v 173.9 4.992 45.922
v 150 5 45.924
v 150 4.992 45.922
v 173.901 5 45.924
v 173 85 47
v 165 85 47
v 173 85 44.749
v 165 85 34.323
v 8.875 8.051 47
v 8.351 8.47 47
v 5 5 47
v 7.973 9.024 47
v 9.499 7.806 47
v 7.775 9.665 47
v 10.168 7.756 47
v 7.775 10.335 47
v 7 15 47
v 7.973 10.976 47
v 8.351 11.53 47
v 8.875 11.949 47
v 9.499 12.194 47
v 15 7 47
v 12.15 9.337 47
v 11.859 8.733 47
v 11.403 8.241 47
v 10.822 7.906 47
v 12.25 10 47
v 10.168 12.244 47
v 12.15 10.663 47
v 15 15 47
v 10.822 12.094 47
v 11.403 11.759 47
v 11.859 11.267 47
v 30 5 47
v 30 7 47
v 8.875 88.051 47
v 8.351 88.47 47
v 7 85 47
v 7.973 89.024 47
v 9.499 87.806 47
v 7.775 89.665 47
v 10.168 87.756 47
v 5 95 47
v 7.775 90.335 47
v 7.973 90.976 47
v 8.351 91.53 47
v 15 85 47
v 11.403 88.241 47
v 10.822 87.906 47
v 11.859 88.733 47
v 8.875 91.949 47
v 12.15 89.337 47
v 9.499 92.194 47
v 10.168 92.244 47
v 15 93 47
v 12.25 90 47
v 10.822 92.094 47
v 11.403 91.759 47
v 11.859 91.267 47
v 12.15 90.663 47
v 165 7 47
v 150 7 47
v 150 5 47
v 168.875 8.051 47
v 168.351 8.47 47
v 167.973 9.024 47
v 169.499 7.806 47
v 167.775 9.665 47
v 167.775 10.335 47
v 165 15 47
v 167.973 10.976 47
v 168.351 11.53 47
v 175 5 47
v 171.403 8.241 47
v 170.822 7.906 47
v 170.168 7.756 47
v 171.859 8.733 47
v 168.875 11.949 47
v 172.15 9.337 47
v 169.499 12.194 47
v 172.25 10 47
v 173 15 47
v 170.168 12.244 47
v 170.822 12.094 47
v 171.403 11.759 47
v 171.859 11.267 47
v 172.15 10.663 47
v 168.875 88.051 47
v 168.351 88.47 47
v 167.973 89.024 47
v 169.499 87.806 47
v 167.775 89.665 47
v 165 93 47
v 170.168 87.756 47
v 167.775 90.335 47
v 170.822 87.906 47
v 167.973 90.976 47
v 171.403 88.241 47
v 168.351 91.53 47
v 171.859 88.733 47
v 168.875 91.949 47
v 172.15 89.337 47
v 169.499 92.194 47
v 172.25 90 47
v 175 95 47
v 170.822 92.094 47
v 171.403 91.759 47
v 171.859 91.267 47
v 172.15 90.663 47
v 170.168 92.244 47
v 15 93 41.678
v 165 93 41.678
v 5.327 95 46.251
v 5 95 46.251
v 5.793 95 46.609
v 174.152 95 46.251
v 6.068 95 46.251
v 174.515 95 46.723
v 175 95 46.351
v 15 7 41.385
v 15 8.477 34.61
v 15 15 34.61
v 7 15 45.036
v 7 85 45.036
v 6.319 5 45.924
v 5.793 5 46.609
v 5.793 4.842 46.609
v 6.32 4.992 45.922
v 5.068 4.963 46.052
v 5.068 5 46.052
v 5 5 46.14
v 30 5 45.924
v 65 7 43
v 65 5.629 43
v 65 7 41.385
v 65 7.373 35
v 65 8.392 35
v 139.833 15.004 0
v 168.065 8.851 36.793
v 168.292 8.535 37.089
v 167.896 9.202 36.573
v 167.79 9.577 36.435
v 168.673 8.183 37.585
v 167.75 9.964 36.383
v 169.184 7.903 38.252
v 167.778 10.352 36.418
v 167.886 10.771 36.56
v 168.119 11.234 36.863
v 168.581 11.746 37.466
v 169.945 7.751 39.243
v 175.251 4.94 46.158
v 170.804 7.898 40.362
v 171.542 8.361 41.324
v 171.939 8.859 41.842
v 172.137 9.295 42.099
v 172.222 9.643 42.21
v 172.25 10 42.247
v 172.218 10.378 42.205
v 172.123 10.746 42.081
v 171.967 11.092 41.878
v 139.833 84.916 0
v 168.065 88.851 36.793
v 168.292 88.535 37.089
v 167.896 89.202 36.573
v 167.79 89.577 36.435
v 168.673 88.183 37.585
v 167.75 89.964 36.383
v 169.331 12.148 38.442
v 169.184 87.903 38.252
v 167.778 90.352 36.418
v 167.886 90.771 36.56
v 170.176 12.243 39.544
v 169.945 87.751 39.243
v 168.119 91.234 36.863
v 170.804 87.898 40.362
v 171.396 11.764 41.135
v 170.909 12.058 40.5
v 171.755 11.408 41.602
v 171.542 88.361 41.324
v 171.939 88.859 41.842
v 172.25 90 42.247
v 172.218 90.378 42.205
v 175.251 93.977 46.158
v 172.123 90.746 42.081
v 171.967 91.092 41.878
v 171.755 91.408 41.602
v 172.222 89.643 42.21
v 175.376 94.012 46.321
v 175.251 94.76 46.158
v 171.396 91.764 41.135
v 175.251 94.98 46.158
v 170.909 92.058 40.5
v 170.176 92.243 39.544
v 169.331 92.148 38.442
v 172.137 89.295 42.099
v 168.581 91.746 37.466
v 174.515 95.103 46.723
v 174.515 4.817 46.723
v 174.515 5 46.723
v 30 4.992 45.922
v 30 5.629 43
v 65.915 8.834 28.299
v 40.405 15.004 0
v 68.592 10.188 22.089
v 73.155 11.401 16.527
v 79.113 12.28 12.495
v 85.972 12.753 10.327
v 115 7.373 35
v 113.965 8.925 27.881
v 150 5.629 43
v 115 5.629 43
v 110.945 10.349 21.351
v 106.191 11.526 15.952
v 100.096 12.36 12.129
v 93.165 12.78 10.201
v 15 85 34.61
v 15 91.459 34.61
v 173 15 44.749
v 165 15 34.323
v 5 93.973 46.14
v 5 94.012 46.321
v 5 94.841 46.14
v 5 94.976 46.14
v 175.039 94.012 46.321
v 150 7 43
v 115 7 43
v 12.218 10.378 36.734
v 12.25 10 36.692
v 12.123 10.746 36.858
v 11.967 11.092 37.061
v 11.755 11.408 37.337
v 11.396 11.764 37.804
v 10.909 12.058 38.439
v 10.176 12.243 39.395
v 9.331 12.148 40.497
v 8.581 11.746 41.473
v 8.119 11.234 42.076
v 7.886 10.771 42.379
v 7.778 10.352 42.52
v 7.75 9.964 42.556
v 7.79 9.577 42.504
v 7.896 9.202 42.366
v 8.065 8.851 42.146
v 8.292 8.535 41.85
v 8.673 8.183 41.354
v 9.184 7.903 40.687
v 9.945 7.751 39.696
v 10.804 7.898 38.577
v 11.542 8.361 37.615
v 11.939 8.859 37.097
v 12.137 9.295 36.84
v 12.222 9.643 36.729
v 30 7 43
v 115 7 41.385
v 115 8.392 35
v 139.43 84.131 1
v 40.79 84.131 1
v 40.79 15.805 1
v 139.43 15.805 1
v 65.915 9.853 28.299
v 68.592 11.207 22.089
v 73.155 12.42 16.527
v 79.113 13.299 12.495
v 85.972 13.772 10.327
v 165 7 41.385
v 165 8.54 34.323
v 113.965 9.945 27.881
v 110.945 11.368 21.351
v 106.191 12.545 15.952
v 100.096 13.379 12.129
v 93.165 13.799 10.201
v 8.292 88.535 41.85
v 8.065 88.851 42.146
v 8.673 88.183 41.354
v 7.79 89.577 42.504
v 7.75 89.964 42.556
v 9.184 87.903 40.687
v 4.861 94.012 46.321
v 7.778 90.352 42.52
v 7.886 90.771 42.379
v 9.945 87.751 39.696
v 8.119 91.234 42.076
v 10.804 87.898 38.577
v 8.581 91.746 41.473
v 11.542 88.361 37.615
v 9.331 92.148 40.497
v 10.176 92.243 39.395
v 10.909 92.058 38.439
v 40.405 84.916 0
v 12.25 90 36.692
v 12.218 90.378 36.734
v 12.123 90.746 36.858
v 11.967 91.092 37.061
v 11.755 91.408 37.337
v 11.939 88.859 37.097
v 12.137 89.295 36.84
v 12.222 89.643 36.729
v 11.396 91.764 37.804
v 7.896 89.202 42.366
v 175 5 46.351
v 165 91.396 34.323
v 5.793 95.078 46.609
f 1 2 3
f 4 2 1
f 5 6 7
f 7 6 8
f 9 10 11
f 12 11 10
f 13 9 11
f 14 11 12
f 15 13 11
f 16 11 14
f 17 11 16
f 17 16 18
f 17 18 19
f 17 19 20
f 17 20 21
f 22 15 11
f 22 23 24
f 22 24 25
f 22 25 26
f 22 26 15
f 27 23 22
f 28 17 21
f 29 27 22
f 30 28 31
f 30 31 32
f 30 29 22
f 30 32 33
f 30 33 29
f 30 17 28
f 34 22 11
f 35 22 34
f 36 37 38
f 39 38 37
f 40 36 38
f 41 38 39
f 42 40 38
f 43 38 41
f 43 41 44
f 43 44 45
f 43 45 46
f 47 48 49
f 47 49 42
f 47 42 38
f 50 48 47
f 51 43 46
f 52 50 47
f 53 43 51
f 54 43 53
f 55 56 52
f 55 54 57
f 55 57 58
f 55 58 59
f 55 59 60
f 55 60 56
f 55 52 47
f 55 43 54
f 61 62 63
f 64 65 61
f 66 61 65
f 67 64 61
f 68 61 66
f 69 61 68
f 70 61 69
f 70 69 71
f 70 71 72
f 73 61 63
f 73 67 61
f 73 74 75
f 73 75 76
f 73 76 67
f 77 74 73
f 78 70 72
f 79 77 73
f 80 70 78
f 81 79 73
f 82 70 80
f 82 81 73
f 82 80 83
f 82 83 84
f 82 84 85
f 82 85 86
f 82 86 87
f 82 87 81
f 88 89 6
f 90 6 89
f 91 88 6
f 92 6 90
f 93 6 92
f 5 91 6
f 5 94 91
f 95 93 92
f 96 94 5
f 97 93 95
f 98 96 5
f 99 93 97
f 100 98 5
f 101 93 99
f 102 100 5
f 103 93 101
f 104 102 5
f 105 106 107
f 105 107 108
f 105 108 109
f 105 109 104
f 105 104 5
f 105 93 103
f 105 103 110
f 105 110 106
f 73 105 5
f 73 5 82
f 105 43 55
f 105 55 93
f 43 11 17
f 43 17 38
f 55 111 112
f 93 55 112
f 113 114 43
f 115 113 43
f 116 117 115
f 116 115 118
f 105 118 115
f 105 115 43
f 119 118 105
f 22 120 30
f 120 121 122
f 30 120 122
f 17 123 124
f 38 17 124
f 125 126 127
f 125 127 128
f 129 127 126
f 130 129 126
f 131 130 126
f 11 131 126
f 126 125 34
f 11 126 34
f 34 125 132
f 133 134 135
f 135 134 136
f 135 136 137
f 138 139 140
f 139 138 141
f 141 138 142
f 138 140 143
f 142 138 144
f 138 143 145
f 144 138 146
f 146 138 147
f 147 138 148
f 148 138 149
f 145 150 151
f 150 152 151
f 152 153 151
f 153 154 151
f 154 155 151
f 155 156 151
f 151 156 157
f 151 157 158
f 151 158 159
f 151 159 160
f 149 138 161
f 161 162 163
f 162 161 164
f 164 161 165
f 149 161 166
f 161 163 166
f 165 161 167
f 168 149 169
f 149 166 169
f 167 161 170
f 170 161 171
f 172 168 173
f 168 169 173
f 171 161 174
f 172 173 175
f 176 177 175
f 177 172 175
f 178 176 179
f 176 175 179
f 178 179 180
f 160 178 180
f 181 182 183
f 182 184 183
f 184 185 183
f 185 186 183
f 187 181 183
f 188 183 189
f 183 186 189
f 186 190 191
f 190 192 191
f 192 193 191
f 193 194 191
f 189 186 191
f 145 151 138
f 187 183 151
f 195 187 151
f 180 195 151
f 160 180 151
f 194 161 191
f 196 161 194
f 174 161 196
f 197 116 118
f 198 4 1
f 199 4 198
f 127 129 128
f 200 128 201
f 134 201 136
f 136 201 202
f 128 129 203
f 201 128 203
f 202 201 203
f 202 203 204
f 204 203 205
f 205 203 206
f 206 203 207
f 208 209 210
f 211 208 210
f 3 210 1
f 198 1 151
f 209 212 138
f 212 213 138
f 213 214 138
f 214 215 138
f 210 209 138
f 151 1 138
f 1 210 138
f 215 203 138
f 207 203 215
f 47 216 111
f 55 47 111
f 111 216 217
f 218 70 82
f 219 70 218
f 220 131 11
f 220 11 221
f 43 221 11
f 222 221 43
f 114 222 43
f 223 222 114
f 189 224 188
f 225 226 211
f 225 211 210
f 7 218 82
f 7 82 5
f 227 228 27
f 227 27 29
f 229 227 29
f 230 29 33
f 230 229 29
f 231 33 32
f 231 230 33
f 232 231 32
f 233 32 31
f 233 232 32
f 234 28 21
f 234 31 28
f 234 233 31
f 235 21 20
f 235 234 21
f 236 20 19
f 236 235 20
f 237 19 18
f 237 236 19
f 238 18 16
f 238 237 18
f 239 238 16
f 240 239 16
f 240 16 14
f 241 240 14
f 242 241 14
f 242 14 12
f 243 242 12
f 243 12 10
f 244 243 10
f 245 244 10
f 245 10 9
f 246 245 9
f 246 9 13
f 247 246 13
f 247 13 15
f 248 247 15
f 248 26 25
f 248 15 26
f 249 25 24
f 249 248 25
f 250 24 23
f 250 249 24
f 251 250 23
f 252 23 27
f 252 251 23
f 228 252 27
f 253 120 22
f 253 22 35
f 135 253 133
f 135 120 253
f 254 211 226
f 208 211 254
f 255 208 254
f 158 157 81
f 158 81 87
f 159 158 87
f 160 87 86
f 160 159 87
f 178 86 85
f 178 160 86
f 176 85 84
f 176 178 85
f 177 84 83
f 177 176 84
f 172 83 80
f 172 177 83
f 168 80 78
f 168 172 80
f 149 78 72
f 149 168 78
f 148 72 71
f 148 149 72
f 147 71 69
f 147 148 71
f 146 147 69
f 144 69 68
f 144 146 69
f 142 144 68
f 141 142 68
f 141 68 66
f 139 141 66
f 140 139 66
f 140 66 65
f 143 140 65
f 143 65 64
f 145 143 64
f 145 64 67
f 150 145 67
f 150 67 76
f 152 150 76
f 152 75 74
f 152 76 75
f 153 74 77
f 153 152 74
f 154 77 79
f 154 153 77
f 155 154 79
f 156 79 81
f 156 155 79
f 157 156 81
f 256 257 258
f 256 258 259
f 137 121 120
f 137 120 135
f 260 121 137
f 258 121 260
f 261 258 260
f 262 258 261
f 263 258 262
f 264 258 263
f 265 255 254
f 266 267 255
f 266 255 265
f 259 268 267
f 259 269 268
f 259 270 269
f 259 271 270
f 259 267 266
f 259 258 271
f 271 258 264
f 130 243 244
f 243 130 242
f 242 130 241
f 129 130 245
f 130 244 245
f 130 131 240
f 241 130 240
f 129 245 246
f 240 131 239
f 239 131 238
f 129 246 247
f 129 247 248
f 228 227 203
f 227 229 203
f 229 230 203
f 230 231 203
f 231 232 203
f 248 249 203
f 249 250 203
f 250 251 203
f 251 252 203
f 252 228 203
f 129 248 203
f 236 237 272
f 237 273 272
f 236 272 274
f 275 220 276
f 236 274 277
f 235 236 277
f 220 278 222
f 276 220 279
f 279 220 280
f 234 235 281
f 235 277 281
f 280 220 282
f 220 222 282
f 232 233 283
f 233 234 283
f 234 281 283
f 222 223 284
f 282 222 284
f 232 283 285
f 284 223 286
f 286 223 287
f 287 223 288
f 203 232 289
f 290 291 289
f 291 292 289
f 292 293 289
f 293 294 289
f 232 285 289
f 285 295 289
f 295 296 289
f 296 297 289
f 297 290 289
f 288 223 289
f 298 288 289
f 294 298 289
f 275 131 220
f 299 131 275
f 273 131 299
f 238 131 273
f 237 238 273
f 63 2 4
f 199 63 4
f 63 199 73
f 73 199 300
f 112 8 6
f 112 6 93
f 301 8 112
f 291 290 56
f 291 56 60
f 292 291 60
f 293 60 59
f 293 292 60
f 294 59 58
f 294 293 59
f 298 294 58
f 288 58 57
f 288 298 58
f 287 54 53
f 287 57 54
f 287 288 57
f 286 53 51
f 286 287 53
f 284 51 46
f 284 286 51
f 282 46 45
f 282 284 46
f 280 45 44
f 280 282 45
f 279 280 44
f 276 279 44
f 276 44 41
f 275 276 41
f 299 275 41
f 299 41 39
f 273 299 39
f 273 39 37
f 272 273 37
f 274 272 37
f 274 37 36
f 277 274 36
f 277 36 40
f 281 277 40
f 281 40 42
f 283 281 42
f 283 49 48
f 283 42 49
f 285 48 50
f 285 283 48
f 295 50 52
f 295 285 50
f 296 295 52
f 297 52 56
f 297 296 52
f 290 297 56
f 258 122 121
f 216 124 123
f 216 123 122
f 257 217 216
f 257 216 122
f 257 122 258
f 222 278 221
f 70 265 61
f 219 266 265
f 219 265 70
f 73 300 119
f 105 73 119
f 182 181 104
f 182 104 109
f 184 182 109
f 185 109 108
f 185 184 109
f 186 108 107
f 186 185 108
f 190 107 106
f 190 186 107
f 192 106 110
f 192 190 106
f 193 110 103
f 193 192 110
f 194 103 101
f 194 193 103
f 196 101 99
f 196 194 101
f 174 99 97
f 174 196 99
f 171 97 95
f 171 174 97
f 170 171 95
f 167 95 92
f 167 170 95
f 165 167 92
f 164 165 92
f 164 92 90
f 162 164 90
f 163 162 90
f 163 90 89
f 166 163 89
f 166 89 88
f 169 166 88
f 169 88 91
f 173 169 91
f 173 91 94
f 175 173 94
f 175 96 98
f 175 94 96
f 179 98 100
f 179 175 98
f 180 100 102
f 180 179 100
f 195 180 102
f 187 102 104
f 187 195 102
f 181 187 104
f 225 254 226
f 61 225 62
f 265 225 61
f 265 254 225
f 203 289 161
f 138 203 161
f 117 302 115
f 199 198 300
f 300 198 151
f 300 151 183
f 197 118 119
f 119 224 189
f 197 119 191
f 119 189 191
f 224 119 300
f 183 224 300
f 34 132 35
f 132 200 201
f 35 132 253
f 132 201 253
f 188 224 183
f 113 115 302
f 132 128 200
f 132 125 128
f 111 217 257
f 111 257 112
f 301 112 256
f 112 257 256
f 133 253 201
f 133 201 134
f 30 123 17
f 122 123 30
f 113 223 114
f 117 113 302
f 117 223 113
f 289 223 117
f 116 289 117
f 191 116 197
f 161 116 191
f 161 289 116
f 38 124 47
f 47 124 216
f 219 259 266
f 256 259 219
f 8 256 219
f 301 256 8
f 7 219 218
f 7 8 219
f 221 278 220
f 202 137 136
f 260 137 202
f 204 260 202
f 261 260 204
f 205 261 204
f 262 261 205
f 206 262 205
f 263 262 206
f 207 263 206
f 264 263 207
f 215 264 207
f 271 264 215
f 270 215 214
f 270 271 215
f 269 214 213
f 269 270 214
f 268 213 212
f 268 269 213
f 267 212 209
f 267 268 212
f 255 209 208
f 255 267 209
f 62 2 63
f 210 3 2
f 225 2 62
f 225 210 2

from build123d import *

# Parameters (mm, degrees)
BOX020_W               = 50
BOX020_H               = 20
BOX020_DEPTH           = 25
CYLINDER004_R          = 25
CYLINDER004_DEPTH      = 20
CYLINDER004_ROLL_ANGLE = 90
BOX019_W               = 120
BOX019_H               = 10
BOX019_DEPTH           = 10
CYLINDER003_R          = 2.25
CYLINDER003_DEPTH      = 60
CYLINDER002_R          = 2.25
CYLINDER002_DEPTH      = 60
CYLINDER001_R          = 2.25
CYLINDER001_DEPTH      = 60
CYLINDER_R             = 2.25
CYLINDER_DEPTH         = 60
BOX018_W               = 180
BOX018_H               = 50
BOX018_DEPTH           = 60
BOX018_ROLL_ANGLE      = -12.3
BOX017_W               = 180
BOX017_H               = 50
BOX017_DEPTH           = 60
BOX017_ROLL_ANGLE      = 12.3
BOX016_W               = 70
BOX016_H               = 100
BOX016_DEPTH           = 50
BOX016_PITCH_ANGLE     = 52.5
BOX015_W               = 70
BOX015_H               = 100
BOX015_DEPTH           = 50
BOX015_PITCH_ANGLE     = -52.5
BOX007_W               = 100
BOX007_H               = 70
BOX007_DEPTH           = 1
BOX014_W               = 170
BOX014_H               = 2
BOX014_DEPTH           = 7
BOX013_W               = 170
BOX013_H               = 2
BOX013_DEPTH           = 7
BOX012_W               = 2
BOX012_H               = 80
BOX012_DEPTH           = 2.5
BOX011_W               = 2
BOX011_H               = 80
BOX011_DEPTH           = 2.5
BOX010_W               = 10
BOX010_H               = 10
BOX010_DEPTH           = 13
BOX009_W               = 10
BOX009_H               = 10
BOX009_DEPTH           = 13
BOX008_W               = 10
BOX008_H               = 10
BOX008_DEPTH           = 13
BOX_W                  = 10
BOX_H                  = 10
BOX_DEPTH              = 13
BOX005_W               = 180
BOX005_H               = 1
BOX005_DEPTH           = 47
BOX005_ROLL_ANGLE      = -12.3
BOX004_W               = 180
BOX004_H               = 1
BOX004_DEPTH           = 47
BOX004_ROLL_ANGLE      = 12.3
BOX003_W               = 58
BOX003_H               = 100
BOX003_DEPTH           = 1
BOX003_PITCH_ANGLE     = -52.5
BOX002_W               = 58
BOX002_H               = 100
BOX002_DEPTH           = 1
BOX002_PITCH_ANGLE     = 52.5


with BuildPart() as cube020:
    # Box020 → Box020 (new body)
    with BuildSketch(Plane(origin=(65, 0, 35), x_dir=(1, 0, 0), z_dir=(0, 0, 1))):
        with Locations((25, 10)):
            Rectangle(BOX020_W, BOX020_H)
    extrude(amount=BOX020_DEPTH)


with BuildPart() as cylinder:
    # Cylinder004 → Cylinder004 (new body)
    with BuildSketch(Plane.XY):
        Circle(CYLINDER004_R)
    extrude(amount=CYLINDER004_DEPTH)


with BuildPart() as cylinder_1:
    # Cylinder004 roll: moved
    add(cylinder.part.rotate(Axis((0, 0, 0), (1, 0, 0)), CYLINDER004_ROLL_ANGLE))


with BuildPart() as cylinder_2:
    # Cylinder004 placement: moved
    add(cylinder_1.part.moved(Location((90, 20, 35))))


with BuildPart() as cube019:
    # Box019 → Box019 (new body)
    with BuildSketch(Plane(origin=(30, 0, 43), x_dir=(1, 0, 0), z_dir=(0, 0, 1))):
        with Locations((60, 5)):
            Rectangle(BOX019_W, BOX019_H)
    extrude(amount=BOX019_DEPTH)


with BuildPart() as cylinder003:
    # Cylinder003 → Cylinder003 (new body)
    with BuildSketch(Plane(origin=(170, 90, 0), x_dir=(1, 0, 0), z_dir=(0, 0, 1))):
        Circle(CYLINDER003_R)
    extrude(amount=CYLINDER003_DEPTH)


with BuildPart() as cylinder002:
    # Cylinder002 → Cylinder002 (new body)
    with BuildSketch(Plane(origin=(10, 90, 0), x_dir=(1, 0, 0), z_dir=(0, 0, 1))):
        Circle(CYLINDER002_R)
    extrude(amount=CYLINDER002_DEPTH)


with BuildPart() as cylinder001:
    # Cylinder001 → Cylinder001 (new body)
    with BuildSketch(Plane(origin=(170, 10, 0), x_dir=(1, 0, 0), z_dir=(0, 0, 1))):
        Circle(CYLINDER001_R)
    extrude(amount=CYLINDER001_DEPTH)


with BuildPart() as cylinder000:
    # Cylinder → Cylinder (new body)
    with BuildSketch(Plane(origin=(10, 10, 0), x_dir=(1, 0, 0), z_dir=(0, 0, 1))):
        Circle(CYLINDER_R)
    extrude(amount=CYLINDER_DEPTH)


with BuildPart() as cube018:
    # Box018 → Box018 (new body)
    with BuildSketch(Plane.XY):
        with Locations((90, 25)):
            Rectangle(BOX018_W, BOX018_H)
    extrude(amount=BOX018_DEPTH)


with BuildPart() as cube018_1:
    # Box018 roll: moved
    add(cube018.part.rotate(Axis((0, 0, 0), (1, 0, 0)), BOX018_ROLL_ANGLE))


with BuildPart() as cube018_2:
    # Box018 placement: moved
    add(cube018_1.part.moved(Location((1, 84, -4.2))))


with BuildPart() as cube017:
    # Box017 → Box017 (new body)
    with BuildSketch(Plane.XY):
        with Locations((90, 25)):
            Rectangle(BOX017_W, BOX017_H)
    extrude(amount=BOX017_DEPTH)


with BuildPart() as cube017_1:
    # Box017 roll: moved
    add(cube017.part.rotate(Axis((0, 0, 0), (1, 0, 0)), BOX017_ROLL_ANGLE))


with BuildPart() as cube017_2:
    # Box017 placement: moved
    add(cube017_1.part.moved(Location((1, -32.9, -15))))


with BuildPart() as cube016:
    # Box016 → Box016 (new body)
    with BuildSketch(Plane.XY):
        with Locations((35, 50)):
            Rectangle(BOX016_W, BOX016_H)
    extrude(amount=BOX016_DEPTH)


with BuildPart() as cube016_1:
    # Box016 pitch: moved
    add(cube016.part.rotate(Axis((0, 0, 0), (0, 1, 0)), BOX016_PITCH_ANGLE))


with BuildPart() as cube016_2:
    # Box016 placement: moved
    add(cube016_1.part.moved(Location((-39.5, 0, 22))))


with BuildPart() as cube015:
    # Box015 → Box015 (new body)
    with BuildSketch(Plane.XY):
        with Locations((35, 50)):
            Rectangle(BOX015_W, BOX015_H)
    extrude(amount=BOX015_DEPTH)


with BuildPart() as cube015_1:
    # Box015 pitch: moved
    add(cube015.part.rotate(Axis((0, 0, 0), (0, 1, 0)), BOX015_PITCH_ANGLE))


with BuildPart() as cube015_2:
    # Box015 placement: moved
    add(cube015_1.part.moved(Location((176, 0, -35))))


with BuildPart() as cube007:
    # Box007 → Box007 (new body)
    with BuildSketch(Plane(origin=(40, 15, 0), x_dir=(1, 0, 0), z_dir=(0, 0, 1))):
        with Locations((50, 35)):
            Rectangle(BOX007_W, BOX007_H)
    extrude(amount=BOX007_DEPTH)


with BuildPart() as cube014:
    # Box014 → Box014 (new body)
    with BuildSketch(Plane(origin=(5, 93, 40), x_dir=(1, 0, 0), z_dir=(0, 0, 1))):
        with Locations((85, 1)):
            Rectangle(BOX014_W, BOX014_H)
    extrude(amount=BOX014_DEPTH)


with BuildPart() as cube013:
    # Box013 → Box013 (new body)
    with BuildSketch(Plane(origin=(5, 5, 40), x_dir=(1, 0, 0), z_dir=(0, 0, 1))):
        with Locations((85, 1)):
            Rectangle(BOX013_W, BOX013_H)
    extrude(amount=BOX013_DEPTH)


with BuildPart() as cube012:
    # Box012 → Box012 (new body)
    with BuildSketch(Plane(origin=(173, 5, 44.5), x_dir=(1, 0, 0), z_dir=(0, 0, 1))):
        with Locations((1, 40)):
            Rectangle(BOX012_W, BOX012_H)
    extrude(amount=BOX012_DEPTH)


with BuildPart() as cube011:
    # Box011 → Box011 (new body)
    with BuildSketch(Plane(origin=(5, 5, 44.5), x_dir=(1, 0, 0), z_dir=(0, 0, 1))):
        with Locations((1, 40)):
            Rectangle(BOX011_W, BOX011_H)
    extrude(amount=BOX011_DEPTH)


with BuildPart() as cube010:
    # Box010 → Box010 (new body)
    with BuildSketch(Plane(origin=(5, 85, 34), x_dir=(1, 0, 0), z_dir=(0, 0, 1))):
        with Locations((5, 5)):
            Rectangle(BOX010_W, BOX010_H)
    extrude(amount=BOX010_DEPTH)


with BuildPart() as cube009:
    # Box009 → Box009 (new body)
    with BuildSketch(Plane(origin=(165, 85, 34), x_dir=(1, 0, 0), z_dir=(0, 0, 1))):
        with Locations((5, 5)):
            Rectangle(BOX009_W, BOX009_H)
    extrude(amount=BOX009_DEPTH)


with BuildPart() as cube008:
    # Box008 → Box008 (new body)
    with BuildSketch(Plane(origin=(165, 5, 34), x_dir=(1, 0, 0), z_dir=(0, 0, 1))):
        with Locations((5, 5)):
            Rectangle(BOX008_W, BOX008_H)
    extrude(amount=BOX008_DEPTH)


with BuildPart() as cube:
    # Box → Box (new body)
    with BuildSketch(Plane(origin=(5, 5, 34), x_dir=(1, 0, 0), z_dir=(0, 0, 1))):
        with Locations((5, 5)):
            Rectangle(BOX_W, BOX_H)
    extrude(amount=BOX_DEPTH)


with BuildPart() as cube005:
    # Box005 → Box005 (new body)
    with BuildSketch(Plane.XY):
        with Locations((90, 0.5)):
            Rectangle(BOX005_W, BOX005_H)
    extrude(amount=BOX005_DEPTH)


with BuildPart() as cube005_1:
    # Box005 roll: moved
    add(cube005.part.rotate(Axis((0, 0, 0), (1, 0, 0)), BOX005_ROLL_ANGLE))


with BuildPart() as cube005_2:
    # Box005 placement: moved
    add(cube005_1.part.moved(Location((1, 84, 0.4))))


with BuildPart() as fusion001:
    # Box004 → Box004 (new body)
    with BuildSketch(Plane.XY):
        with Locations((90, 0.5)):
            Rectangle(BOX004_W, BOX004_H)
    extrude(amount=BOX004_DEPTH)


with BuildPart() as fusion001_1:
    # Box004 roll: moved
    add(fusion001.part.rotate(Axis((0, 0, 0), (1, 0, 0)), BOX004_ROLL_ANGLE))


with BuildPart() as fusion001_2:
    # Box004 placement: moved
    add(fusion001_1.part.moved(Location((1, 15, 0))))

    # Fusion001: union Cube005
    add(cube005_2.part)


with BuildPart() as cube003:
    # Box003 → Box003 (new body)
    with BuildSketch(Plane.XY):
        with Locations((29, 50)):
            Rectangle(BOX003_W, BOX003_H)
    extrude(amount=BOX003_DEPTH)


with BuildPart() as cube003_1:
    # Box003 pitch: moved
    add(cube003.part.rotate(Axis((0, 0, 0), (0, 1, 0)), BOX003_PITCH_ANGLE))


with BuildPart() as cube003_2:
    # Box003 placement: moved
    add(cube003_1.part.moved(Location((140, 0, 0.1))))


with BuildPart() as cut010:
    # Box002 → Box002 (new body)
    with BuildSketch(Plane.XY):
        with Locations((29, 50)):
            Rectangle(BOX002_W, BOX002_H)
    extrude(amount=BOX002_DEPTH)


with BuildPart() as cut010_1:
    # Box002 pitch: moved
    add(cut010.part.rotate(Axis((0, 0, 0), (0, 1, 0)), BOX002_PITCH_ANGLE))


with BuildPart() as cut010_2:
    # Box002 placement: moved
    add(cut010_1.part.moved(Location((5, 0, 46))))

    # Fusion: union Cube003
    add(cube003_2.part)

    # Fusion002: union Fusion001
    add(fusion001_2.part)

    # Fusion003: union Cube
    add(cube.part)

    # Fusion004: union Cube008
    add(cube008.part)

    # Fusion005: union Cube009
    add(cube009.part)

    # Fusion006: union Cube010
    add(cube010.part)

    # Fusion007: union Cube011
    add(cube011.part)

    # Fusion008: union Cube012
    add(cube012.part)

    # Fusion009: union Cube013
    add(cube013.part)

    # Fusion010: union Cube014
    add(cube014.part)

    # Fusion011: union Cube007
    add(cube007.part)

    # Cut: cut Cube015
    add(cube015_2.part, mode=Mode.SUBTRACT)

    # Cut001: cut Cube016
    add(cube016_2.part, mode=Mode.SUBTRACT)

    # Cut002: cut Cube017
    add(cube017_2.part, mode=Mode.SUBTRACT)

    # Cut003: cut Cube018
    add(cube018_2.part, mode=Mode.SUBTRACT)

    # Cut004: cut Cylinder000
    add(cylinder000.part, mode=Mode.SUBTRACT)

    # Cut005: cut Cylinder001
    add(cylinder001.part, mode=Mode.SUBTRACT)

    # Cut006: cut Cylinder002
    add(cylinder002.part, mode=Mode.SUBTRACT)

    # Cut007: cut Cylinder003
    add(cylinder003.part, mode=Mode.SUBTRACT)

    # Cut008: cut Cube019
    add(cube019.part, mode=Mode.SUBTRACT)

    # Cut009: cut Cylinder
    add(cylinder_2.part, mode=Mode.SUBTRACT)

    # Cut010: cut Cube020
    add(cube020.part, mode=Mode.SUBTRACT)


solid = cut010_2.part
